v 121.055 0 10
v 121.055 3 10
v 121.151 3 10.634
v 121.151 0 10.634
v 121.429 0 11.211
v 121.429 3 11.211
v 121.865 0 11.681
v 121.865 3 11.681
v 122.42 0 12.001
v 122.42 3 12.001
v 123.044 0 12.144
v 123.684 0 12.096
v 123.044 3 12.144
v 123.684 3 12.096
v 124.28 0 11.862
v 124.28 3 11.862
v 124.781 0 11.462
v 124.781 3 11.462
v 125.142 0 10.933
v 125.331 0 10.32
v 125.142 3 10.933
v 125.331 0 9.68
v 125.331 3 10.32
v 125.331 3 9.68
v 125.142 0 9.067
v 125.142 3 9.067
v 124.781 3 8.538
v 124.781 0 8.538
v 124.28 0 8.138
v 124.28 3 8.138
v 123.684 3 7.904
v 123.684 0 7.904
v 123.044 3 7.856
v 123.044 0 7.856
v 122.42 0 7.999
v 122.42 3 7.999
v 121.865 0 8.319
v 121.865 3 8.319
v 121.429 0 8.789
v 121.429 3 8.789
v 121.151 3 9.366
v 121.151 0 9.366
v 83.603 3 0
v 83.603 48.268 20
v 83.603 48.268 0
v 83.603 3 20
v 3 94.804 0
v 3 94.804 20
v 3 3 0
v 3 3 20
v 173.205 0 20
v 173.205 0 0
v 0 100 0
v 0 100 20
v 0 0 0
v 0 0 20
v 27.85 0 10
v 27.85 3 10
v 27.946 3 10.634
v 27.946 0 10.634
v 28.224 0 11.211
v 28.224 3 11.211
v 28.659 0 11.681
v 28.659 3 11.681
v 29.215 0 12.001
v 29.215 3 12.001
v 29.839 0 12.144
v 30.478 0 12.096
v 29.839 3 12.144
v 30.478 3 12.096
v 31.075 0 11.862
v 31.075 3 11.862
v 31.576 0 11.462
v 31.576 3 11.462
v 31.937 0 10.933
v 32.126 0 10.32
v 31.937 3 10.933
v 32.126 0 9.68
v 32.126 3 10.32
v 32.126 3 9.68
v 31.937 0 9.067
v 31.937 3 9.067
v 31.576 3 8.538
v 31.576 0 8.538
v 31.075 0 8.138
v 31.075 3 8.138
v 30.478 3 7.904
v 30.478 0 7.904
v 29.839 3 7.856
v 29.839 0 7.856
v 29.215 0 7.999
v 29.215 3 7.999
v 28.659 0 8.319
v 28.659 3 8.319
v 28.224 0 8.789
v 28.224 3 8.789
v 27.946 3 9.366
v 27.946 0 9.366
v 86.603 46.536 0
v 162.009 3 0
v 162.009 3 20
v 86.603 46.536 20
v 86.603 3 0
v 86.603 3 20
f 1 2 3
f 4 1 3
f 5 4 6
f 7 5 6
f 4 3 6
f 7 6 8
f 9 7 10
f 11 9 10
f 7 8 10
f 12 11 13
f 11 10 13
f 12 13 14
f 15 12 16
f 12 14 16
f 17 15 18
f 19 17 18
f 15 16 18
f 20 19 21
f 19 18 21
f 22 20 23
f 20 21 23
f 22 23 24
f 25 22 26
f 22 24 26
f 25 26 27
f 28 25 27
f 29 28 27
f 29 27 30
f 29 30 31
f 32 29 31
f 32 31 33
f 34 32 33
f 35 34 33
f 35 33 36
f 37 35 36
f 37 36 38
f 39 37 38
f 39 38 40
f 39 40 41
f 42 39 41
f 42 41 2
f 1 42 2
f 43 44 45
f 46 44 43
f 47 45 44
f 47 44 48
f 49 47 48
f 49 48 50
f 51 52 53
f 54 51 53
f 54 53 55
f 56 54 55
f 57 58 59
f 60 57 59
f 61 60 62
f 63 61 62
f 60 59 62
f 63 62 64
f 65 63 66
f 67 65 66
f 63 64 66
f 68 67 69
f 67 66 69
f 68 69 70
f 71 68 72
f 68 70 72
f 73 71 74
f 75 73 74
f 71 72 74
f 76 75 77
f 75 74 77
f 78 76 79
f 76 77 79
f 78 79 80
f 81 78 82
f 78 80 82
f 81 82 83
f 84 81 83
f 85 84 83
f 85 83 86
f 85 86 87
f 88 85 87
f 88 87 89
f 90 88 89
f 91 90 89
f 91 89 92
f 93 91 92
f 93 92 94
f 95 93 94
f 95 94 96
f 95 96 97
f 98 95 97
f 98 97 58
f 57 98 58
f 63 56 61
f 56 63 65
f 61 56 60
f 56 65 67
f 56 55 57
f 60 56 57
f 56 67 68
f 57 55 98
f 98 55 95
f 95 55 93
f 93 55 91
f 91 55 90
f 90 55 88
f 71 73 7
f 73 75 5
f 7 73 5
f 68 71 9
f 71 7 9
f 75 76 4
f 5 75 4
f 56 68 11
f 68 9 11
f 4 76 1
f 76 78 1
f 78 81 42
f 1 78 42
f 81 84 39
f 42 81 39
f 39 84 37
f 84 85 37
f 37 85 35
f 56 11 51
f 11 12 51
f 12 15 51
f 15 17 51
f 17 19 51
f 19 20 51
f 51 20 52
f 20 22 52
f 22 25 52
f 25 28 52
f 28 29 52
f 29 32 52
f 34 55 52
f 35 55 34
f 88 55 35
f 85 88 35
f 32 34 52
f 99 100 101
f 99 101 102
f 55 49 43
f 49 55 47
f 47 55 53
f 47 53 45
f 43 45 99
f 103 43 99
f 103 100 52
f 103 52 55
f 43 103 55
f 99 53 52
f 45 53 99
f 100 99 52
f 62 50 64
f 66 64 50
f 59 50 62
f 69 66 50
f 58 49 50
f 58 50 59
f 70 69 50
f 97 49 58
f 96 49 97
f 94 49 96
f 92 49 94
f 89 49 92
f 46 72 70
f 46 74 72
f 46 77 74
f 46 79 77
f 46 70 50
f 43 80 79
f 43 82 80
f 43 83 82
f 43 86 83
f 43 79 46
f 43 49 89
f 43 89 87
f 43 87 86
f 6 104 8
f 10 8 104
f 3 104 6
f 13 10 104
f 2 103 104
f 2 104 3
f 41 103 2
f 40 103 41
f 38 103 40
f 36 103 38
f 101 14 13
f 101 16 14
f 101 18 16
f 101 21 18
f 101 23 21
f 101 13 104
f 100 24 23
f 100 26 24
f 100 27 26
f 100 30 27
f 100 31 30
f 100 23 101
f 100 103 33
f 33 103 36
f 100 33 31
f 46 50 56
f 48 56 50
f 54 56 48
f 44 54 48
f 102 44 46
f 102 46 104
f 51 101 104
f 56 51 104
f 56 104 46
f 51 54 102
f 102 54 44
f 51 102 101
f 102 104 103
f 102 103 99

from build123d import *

# Parameters (mm, degrees)
F1_DEPTH = 20
F2_T     = -3
F4_DEPTH = 20
F6_D     = 4.3
F6_DEPTH = 5
F6_TIP   = 1.2918503309


with BuildPart() as f1:
    # F0 (on Top) → F1 (new body)
    with BuildSketch(Plane.XY):
        Polygon((0, 100), (0, 0), (173.2050807569, 0), align=None)
    extrude(amount=F1_DEPTH)

    # F2
    f2_openings = [f1.faces().sort_by_distance(p)[0] for p in [
        (57.735027, 33.333333, 20),
        (57.735027, 33.333333, 0),
    ]]
    offset(amount=F2_T, openings=f2_openings)

    # F3 (on face) → F4 (join)
    with BuildSketch(Plane.XY.offset(20)):
        Polygon((86.6025403784, 3), (86.6025403784, 46.5358983849), (83.6025403784, 48.2679491924), (83.6025403784, 3), align=None)
    extrude(amount=-F4_DEPTH)

    # F6
    with Locations(Plane.XZ):
        with Locations((30, 10), (123.2050807569, 10)):
            Hole(F6_D / 2, depth=F6_DEPTH)
            with Locations((0, 0, -(F6_DEPTH + F6_TIP / 2))):  # 118° drill point
                Cone(0, F6_D / 2, F6_TIP, mode=Mode.SUBTRACT)


solid = f1.part
